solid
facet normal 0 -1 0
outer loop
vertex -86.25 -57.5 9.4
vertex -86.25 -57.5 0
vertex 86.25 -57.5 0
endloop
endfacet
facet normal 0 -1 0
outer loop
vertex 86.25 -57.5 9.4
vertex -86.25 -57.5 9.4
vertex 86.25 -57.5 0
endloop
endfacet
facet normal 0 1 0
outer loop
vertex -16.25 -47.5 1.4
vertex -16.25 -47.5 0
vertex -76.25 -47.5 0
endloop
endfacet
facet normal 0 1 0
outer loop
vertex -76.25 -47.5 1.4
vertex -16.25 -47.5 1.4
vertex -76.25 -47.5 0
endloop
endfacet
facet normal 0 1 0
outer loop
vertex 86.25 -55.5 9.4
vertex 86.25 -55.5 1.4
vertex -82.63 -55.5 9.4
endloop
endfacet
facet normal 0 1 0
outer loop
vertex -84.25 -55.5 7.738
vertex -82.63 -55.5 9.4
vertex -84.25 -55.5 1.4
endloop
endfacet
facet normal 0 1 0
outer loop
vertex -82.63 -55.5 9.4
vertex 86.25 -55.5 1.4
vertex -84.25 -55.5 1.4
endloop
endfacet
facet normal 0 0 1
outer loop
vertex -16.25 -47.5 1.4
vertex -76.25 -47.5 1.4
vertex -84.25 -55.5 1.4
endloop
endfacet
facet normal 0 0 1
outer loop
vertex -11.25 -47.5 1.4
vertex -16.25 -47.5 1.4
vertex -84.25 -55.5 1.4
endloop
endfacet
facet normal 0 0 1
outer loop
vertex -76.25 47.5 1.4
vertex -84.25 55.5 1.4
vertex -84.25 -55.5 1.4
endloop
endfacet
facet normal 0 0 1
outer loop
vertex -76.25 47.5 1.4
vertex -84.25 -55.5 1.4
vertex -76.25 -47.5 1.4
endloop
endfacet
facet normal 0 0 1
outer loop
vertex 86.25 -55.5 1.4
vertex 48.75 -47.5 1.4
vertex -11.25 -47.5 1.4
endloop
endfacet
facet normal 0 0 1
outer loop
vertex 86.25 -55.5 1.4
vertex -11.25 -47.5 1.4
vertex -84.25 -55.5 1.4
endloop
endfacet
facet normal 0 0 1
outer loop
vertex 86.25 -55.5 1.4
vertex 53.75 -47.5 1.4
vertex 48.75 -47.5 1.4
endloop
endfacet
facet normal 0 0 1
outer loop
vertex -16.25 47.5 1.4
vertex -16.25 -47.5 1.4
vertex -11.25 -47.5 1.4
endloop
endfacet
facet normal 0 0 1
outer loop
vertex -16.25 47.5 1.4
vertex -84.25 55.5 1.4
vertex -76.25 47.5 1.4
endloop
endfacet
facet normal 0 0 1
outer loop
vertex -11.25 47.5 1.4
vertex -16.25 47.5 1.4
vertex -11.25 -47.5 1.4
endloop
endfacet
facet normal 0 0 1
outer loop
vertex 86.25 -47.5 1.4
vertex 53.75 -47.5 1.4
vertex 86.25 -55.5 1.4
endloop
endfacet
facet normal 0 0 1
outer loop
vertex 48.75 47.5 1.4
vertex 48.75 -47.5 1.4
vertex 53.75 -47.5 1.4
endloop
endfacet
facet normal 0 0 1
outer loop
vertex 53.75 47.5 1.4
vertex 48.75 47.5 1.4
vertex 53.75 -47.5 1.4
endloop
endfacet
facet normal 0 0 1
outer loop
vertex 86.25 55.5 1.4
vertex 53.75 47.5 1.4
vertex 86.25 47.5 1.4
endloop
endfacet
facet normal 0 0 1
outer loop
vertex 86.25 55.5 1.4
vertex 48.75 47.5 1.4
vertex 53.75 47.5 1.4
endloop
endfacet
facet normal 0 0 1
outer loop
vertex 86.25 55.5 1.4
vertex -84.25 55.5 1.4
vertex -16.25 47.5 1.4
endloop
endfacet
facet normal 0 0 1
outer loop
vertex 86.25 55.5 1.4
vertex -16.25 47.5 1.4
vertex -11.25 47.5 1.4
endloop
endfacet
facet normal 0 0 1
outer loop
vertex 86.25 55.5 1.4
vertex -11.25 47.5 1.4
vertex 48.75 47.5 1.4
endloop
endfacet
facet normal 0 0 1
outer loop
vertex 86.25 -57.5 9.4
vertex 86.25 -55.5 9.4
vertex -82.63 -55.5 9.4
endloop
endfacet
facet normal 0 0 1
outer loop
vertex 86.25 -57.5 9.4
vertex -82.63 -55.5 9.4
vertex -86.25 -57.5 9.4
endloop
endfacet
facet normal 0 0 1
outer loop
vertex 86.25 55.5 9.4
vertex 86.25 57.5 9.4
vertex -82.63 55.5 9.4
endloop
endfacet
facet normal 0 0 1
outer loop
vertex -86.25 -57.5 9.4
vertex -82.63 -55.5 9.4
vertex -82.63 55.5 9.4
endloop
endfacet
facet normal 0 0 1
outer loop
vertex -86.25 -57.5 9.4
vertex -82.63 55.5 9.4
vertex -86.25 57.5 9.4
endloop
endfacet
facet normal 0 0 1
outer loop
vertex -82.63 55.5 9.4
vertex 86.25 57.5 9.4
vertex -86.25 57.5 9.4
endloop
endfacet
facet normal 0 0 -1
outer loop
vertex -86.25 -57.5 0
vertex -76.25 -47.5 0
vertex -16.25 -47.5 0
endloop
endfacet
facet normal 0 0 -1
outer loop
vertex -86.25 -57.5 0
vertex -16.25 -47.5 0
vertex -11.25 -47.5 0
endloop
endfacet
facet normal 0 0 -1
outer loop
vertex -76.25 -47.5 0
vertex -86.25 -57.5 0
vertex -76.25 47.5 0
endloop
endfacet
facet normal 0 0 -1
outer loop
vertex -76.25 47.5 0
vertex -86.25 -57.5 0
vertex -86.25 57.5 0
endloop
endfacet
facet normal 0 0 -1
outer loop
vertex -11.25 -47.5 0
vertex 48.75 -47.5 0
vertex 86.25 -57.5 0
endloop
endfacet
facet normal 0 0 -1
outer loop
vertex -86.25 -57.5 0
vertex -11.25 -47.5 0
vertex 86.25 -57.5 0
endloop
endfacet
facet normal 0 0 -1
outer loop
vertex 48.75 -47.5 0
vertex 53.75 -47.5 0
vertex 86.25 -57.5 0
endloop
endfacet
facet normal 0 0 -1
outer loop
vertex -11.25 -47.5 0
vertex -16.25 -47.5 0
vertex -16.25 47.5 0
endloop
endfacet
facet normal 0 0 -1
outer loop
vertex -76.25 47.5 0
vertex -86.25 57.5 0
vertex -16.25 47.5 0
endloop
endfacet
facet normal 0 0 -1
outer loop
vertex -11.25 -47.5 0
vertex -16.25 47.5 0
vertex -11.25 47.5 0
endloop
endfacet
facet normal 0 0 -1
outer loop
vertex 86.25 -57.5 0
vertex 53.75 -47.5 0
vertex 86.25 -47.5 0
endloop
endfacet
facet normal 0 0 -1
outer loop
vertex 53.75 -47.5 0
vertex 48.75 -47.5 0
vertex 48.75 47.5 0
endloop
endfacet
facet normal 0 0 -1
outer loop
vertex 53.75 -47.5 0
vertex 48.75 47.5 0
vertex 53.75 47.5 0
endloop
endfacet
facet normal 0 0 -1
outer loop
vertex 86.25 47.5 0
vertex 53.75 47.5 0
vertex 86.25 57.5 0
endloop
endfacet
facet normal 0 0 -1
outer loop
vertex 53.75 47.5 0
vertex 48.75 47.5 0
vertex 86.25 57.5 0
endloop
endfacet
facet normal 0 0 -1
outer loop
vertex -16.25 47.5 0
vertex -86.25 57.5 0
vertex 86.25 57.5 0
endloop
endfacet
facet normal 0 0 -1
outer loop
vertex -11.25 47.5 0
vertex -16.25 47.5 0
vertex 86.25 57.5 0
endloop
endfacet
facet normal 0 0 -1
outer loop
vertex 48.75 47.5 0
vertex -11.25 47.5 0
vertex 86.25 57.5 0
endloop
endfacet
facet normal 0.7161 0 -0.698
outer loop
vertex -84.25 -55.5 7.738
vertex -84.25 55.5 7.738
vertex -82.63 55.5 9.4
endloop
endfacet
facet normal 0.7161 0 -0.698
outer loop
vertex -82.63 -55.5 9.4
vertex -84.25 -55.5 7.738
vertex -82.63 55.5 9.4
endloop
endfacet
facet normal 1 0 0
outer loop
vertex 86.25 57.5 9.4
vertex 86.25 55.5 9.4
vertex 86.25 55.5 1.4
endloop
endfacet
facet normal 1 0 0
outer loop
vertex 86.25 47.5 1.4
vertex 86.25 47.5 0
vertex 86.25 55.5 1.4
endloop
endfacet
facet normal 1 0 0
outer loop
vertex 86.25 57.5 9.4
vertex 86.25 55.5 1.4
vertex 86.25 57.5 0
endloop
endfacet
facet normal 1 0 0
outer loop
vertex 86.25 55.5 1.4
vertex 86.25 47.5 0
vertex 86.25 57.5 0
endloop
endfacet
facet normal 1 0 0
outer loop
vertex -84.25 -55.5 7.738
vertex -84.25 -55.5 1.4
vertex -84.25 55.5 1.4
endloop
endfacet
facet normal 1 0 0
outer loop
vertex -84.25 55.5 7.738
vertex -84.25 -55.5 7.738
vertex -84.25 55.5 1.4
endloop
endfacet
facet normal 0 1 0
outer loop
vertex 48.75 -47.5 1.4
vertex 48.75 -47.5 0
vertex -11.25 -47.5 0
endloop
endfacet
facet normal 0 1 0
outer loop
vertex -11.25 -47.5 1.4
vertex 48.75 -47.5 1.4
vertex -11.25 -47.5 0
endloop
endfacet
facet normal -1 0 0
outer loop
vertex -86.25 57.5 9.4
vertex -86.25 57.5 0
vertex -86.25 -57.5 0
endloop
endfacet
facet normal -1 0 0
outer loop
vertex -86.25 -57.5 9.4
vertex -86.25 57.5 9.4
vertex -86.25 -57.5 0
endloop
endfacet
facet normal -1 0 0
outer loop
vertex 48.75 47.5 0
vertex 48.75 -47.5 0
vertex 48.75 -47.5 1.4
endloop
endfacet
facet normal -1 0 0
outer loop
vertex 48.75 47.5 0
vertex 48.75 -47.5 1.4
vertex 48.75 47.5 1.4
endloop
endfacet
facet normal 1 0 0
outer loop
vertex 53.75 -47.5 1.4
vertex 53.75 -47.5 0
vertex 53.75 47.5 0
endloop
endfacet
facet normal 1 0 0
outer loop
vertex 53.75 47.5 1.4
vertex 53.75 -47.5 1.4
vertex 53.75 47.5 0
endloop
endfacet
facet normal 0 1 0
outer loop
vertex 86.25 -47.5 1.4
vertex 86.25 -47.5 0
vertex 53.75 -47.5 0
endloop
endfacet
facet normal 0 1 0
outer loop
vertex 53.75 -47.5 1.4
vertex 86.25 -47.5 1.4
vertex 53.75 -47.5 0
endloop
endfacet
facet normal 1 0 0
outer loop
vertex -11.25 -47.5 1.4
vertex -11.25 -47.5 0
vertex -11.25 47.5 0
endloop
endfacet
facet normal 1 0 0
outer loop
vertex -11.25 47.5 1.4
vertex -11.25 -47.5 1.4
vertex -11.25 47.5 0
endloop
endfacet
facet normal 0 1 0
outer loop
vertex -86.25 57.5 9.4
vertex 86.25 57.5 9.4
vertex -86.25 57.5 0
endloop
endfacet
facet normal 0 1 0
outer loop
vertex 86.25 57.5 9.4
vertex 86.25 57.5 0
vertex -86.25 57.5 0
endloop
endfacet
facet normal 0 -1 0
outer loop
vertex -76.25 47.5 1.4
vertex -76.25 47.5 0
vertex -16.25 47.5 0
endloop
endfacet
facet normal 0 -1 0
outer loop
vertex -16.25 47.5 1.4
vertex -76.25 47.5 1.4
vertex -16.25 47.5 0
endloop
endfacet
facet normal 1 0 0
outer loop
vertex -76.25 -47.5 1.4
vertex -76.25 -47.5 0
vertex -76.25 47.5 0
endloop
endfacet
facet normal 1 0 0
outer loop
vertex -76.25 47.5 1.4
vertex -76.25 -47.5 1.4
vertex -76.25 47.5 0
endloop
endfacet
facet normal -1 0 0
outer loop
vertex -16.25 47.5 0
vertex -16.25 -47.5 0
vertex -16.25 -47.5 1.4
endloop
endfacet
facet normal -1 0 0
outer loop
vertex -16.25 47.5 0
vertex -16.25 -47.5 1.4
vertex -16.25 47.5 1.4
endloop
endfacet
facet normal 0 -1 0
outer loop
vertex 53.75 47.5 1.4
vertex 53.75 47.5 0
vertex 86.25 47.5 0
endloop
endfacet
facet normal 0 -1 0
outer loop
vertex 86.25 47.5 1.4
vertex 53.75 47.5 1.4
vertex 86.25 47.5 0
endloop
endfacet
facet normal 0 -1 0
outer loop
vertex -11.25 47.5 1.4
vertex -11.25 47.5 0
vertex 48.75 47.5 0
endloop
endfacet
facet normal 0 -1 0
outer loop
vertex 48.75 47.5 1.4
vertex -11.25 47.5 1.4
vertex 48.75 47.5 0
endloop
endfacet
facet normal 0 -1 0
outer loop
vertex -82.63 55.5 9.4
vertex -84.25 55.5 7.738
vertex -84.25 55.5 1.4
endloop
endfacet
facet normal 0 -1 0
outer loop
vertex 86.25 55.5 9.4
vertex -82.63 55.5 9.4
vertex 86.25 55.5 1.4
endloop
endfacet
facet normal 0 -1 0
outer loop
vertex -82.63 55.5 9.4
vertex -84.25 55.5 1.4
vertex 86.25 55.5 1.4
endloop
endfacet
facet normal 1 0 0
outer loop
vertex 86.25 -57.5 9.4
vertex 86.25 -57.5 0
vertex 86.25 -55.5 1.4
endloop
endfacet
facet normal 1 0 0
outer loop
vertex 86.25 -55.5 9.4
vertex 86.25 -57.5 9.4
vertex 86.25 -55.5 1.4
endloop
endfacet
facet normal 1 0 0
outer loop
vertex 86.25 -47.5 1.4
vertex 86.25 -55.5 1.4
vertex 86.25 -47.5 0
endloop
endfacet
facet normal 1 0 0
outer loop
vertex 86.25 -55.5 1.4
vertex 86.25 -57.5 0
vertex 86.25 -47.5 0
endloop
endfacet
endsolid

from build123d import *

# Parameters (mm, degrees)
F0_W     = 5
F0_H     = 95
F1_DEPTH = 1.4
F3_DEPTH = 8
F5_DEPTH = 111


with BuildPart() as f1:
    # F0 (on Top) → F1 (new body)
    with BuildSketch(Plane.XY):
        Polygon((86.25, 47.5), (86.25, 57.5), (-86.25, 57.5), (-86.25, -57.5), (86.25, -57.5), (86.25, -47.5), (53.75, -47.5), (48.75, -47.5), (-11.25, -47.5), (-16.25, -47.5), (-76.25, -47.5), (-76.25, 47.5), (-16.25, 47.5), (-11.25, 47.5), (48.75, 47.5), (53.75, 47.5), align=None)
        with Locations((-13.75, 0)):
            Rectangle(F0_W, F0_H)
        with Locations((51.25, 0)):
            Rectangle(F0_W, F0_H)
    extrude(amount=F1_DEPTH)

    # F2 (on face) → F3 (join)
    with BuildSketch(Plane.XY.offset(1.4)):
        Polygon((86.25, -57.5), (86.25, -55.5), (-84.25, -55.5), (-84.25, 55.5), (86.25, 55.5), (86.25, 57.5), (-86.25, 57.5), (-86.25, -57.5), align=None)
    extrude(amount=F3_DEPTH)

    # F4 (on face) → F5 (join, through all)
    with BuildSketch(Plane.XZ.offset(-55.5)):
        Polygon((-84.25, 9.4), (-84.25, 7.737799), (-82.629912, 9.4), align=None)
    extrude(amount=F5_DEPTH)


solid = f1.part
